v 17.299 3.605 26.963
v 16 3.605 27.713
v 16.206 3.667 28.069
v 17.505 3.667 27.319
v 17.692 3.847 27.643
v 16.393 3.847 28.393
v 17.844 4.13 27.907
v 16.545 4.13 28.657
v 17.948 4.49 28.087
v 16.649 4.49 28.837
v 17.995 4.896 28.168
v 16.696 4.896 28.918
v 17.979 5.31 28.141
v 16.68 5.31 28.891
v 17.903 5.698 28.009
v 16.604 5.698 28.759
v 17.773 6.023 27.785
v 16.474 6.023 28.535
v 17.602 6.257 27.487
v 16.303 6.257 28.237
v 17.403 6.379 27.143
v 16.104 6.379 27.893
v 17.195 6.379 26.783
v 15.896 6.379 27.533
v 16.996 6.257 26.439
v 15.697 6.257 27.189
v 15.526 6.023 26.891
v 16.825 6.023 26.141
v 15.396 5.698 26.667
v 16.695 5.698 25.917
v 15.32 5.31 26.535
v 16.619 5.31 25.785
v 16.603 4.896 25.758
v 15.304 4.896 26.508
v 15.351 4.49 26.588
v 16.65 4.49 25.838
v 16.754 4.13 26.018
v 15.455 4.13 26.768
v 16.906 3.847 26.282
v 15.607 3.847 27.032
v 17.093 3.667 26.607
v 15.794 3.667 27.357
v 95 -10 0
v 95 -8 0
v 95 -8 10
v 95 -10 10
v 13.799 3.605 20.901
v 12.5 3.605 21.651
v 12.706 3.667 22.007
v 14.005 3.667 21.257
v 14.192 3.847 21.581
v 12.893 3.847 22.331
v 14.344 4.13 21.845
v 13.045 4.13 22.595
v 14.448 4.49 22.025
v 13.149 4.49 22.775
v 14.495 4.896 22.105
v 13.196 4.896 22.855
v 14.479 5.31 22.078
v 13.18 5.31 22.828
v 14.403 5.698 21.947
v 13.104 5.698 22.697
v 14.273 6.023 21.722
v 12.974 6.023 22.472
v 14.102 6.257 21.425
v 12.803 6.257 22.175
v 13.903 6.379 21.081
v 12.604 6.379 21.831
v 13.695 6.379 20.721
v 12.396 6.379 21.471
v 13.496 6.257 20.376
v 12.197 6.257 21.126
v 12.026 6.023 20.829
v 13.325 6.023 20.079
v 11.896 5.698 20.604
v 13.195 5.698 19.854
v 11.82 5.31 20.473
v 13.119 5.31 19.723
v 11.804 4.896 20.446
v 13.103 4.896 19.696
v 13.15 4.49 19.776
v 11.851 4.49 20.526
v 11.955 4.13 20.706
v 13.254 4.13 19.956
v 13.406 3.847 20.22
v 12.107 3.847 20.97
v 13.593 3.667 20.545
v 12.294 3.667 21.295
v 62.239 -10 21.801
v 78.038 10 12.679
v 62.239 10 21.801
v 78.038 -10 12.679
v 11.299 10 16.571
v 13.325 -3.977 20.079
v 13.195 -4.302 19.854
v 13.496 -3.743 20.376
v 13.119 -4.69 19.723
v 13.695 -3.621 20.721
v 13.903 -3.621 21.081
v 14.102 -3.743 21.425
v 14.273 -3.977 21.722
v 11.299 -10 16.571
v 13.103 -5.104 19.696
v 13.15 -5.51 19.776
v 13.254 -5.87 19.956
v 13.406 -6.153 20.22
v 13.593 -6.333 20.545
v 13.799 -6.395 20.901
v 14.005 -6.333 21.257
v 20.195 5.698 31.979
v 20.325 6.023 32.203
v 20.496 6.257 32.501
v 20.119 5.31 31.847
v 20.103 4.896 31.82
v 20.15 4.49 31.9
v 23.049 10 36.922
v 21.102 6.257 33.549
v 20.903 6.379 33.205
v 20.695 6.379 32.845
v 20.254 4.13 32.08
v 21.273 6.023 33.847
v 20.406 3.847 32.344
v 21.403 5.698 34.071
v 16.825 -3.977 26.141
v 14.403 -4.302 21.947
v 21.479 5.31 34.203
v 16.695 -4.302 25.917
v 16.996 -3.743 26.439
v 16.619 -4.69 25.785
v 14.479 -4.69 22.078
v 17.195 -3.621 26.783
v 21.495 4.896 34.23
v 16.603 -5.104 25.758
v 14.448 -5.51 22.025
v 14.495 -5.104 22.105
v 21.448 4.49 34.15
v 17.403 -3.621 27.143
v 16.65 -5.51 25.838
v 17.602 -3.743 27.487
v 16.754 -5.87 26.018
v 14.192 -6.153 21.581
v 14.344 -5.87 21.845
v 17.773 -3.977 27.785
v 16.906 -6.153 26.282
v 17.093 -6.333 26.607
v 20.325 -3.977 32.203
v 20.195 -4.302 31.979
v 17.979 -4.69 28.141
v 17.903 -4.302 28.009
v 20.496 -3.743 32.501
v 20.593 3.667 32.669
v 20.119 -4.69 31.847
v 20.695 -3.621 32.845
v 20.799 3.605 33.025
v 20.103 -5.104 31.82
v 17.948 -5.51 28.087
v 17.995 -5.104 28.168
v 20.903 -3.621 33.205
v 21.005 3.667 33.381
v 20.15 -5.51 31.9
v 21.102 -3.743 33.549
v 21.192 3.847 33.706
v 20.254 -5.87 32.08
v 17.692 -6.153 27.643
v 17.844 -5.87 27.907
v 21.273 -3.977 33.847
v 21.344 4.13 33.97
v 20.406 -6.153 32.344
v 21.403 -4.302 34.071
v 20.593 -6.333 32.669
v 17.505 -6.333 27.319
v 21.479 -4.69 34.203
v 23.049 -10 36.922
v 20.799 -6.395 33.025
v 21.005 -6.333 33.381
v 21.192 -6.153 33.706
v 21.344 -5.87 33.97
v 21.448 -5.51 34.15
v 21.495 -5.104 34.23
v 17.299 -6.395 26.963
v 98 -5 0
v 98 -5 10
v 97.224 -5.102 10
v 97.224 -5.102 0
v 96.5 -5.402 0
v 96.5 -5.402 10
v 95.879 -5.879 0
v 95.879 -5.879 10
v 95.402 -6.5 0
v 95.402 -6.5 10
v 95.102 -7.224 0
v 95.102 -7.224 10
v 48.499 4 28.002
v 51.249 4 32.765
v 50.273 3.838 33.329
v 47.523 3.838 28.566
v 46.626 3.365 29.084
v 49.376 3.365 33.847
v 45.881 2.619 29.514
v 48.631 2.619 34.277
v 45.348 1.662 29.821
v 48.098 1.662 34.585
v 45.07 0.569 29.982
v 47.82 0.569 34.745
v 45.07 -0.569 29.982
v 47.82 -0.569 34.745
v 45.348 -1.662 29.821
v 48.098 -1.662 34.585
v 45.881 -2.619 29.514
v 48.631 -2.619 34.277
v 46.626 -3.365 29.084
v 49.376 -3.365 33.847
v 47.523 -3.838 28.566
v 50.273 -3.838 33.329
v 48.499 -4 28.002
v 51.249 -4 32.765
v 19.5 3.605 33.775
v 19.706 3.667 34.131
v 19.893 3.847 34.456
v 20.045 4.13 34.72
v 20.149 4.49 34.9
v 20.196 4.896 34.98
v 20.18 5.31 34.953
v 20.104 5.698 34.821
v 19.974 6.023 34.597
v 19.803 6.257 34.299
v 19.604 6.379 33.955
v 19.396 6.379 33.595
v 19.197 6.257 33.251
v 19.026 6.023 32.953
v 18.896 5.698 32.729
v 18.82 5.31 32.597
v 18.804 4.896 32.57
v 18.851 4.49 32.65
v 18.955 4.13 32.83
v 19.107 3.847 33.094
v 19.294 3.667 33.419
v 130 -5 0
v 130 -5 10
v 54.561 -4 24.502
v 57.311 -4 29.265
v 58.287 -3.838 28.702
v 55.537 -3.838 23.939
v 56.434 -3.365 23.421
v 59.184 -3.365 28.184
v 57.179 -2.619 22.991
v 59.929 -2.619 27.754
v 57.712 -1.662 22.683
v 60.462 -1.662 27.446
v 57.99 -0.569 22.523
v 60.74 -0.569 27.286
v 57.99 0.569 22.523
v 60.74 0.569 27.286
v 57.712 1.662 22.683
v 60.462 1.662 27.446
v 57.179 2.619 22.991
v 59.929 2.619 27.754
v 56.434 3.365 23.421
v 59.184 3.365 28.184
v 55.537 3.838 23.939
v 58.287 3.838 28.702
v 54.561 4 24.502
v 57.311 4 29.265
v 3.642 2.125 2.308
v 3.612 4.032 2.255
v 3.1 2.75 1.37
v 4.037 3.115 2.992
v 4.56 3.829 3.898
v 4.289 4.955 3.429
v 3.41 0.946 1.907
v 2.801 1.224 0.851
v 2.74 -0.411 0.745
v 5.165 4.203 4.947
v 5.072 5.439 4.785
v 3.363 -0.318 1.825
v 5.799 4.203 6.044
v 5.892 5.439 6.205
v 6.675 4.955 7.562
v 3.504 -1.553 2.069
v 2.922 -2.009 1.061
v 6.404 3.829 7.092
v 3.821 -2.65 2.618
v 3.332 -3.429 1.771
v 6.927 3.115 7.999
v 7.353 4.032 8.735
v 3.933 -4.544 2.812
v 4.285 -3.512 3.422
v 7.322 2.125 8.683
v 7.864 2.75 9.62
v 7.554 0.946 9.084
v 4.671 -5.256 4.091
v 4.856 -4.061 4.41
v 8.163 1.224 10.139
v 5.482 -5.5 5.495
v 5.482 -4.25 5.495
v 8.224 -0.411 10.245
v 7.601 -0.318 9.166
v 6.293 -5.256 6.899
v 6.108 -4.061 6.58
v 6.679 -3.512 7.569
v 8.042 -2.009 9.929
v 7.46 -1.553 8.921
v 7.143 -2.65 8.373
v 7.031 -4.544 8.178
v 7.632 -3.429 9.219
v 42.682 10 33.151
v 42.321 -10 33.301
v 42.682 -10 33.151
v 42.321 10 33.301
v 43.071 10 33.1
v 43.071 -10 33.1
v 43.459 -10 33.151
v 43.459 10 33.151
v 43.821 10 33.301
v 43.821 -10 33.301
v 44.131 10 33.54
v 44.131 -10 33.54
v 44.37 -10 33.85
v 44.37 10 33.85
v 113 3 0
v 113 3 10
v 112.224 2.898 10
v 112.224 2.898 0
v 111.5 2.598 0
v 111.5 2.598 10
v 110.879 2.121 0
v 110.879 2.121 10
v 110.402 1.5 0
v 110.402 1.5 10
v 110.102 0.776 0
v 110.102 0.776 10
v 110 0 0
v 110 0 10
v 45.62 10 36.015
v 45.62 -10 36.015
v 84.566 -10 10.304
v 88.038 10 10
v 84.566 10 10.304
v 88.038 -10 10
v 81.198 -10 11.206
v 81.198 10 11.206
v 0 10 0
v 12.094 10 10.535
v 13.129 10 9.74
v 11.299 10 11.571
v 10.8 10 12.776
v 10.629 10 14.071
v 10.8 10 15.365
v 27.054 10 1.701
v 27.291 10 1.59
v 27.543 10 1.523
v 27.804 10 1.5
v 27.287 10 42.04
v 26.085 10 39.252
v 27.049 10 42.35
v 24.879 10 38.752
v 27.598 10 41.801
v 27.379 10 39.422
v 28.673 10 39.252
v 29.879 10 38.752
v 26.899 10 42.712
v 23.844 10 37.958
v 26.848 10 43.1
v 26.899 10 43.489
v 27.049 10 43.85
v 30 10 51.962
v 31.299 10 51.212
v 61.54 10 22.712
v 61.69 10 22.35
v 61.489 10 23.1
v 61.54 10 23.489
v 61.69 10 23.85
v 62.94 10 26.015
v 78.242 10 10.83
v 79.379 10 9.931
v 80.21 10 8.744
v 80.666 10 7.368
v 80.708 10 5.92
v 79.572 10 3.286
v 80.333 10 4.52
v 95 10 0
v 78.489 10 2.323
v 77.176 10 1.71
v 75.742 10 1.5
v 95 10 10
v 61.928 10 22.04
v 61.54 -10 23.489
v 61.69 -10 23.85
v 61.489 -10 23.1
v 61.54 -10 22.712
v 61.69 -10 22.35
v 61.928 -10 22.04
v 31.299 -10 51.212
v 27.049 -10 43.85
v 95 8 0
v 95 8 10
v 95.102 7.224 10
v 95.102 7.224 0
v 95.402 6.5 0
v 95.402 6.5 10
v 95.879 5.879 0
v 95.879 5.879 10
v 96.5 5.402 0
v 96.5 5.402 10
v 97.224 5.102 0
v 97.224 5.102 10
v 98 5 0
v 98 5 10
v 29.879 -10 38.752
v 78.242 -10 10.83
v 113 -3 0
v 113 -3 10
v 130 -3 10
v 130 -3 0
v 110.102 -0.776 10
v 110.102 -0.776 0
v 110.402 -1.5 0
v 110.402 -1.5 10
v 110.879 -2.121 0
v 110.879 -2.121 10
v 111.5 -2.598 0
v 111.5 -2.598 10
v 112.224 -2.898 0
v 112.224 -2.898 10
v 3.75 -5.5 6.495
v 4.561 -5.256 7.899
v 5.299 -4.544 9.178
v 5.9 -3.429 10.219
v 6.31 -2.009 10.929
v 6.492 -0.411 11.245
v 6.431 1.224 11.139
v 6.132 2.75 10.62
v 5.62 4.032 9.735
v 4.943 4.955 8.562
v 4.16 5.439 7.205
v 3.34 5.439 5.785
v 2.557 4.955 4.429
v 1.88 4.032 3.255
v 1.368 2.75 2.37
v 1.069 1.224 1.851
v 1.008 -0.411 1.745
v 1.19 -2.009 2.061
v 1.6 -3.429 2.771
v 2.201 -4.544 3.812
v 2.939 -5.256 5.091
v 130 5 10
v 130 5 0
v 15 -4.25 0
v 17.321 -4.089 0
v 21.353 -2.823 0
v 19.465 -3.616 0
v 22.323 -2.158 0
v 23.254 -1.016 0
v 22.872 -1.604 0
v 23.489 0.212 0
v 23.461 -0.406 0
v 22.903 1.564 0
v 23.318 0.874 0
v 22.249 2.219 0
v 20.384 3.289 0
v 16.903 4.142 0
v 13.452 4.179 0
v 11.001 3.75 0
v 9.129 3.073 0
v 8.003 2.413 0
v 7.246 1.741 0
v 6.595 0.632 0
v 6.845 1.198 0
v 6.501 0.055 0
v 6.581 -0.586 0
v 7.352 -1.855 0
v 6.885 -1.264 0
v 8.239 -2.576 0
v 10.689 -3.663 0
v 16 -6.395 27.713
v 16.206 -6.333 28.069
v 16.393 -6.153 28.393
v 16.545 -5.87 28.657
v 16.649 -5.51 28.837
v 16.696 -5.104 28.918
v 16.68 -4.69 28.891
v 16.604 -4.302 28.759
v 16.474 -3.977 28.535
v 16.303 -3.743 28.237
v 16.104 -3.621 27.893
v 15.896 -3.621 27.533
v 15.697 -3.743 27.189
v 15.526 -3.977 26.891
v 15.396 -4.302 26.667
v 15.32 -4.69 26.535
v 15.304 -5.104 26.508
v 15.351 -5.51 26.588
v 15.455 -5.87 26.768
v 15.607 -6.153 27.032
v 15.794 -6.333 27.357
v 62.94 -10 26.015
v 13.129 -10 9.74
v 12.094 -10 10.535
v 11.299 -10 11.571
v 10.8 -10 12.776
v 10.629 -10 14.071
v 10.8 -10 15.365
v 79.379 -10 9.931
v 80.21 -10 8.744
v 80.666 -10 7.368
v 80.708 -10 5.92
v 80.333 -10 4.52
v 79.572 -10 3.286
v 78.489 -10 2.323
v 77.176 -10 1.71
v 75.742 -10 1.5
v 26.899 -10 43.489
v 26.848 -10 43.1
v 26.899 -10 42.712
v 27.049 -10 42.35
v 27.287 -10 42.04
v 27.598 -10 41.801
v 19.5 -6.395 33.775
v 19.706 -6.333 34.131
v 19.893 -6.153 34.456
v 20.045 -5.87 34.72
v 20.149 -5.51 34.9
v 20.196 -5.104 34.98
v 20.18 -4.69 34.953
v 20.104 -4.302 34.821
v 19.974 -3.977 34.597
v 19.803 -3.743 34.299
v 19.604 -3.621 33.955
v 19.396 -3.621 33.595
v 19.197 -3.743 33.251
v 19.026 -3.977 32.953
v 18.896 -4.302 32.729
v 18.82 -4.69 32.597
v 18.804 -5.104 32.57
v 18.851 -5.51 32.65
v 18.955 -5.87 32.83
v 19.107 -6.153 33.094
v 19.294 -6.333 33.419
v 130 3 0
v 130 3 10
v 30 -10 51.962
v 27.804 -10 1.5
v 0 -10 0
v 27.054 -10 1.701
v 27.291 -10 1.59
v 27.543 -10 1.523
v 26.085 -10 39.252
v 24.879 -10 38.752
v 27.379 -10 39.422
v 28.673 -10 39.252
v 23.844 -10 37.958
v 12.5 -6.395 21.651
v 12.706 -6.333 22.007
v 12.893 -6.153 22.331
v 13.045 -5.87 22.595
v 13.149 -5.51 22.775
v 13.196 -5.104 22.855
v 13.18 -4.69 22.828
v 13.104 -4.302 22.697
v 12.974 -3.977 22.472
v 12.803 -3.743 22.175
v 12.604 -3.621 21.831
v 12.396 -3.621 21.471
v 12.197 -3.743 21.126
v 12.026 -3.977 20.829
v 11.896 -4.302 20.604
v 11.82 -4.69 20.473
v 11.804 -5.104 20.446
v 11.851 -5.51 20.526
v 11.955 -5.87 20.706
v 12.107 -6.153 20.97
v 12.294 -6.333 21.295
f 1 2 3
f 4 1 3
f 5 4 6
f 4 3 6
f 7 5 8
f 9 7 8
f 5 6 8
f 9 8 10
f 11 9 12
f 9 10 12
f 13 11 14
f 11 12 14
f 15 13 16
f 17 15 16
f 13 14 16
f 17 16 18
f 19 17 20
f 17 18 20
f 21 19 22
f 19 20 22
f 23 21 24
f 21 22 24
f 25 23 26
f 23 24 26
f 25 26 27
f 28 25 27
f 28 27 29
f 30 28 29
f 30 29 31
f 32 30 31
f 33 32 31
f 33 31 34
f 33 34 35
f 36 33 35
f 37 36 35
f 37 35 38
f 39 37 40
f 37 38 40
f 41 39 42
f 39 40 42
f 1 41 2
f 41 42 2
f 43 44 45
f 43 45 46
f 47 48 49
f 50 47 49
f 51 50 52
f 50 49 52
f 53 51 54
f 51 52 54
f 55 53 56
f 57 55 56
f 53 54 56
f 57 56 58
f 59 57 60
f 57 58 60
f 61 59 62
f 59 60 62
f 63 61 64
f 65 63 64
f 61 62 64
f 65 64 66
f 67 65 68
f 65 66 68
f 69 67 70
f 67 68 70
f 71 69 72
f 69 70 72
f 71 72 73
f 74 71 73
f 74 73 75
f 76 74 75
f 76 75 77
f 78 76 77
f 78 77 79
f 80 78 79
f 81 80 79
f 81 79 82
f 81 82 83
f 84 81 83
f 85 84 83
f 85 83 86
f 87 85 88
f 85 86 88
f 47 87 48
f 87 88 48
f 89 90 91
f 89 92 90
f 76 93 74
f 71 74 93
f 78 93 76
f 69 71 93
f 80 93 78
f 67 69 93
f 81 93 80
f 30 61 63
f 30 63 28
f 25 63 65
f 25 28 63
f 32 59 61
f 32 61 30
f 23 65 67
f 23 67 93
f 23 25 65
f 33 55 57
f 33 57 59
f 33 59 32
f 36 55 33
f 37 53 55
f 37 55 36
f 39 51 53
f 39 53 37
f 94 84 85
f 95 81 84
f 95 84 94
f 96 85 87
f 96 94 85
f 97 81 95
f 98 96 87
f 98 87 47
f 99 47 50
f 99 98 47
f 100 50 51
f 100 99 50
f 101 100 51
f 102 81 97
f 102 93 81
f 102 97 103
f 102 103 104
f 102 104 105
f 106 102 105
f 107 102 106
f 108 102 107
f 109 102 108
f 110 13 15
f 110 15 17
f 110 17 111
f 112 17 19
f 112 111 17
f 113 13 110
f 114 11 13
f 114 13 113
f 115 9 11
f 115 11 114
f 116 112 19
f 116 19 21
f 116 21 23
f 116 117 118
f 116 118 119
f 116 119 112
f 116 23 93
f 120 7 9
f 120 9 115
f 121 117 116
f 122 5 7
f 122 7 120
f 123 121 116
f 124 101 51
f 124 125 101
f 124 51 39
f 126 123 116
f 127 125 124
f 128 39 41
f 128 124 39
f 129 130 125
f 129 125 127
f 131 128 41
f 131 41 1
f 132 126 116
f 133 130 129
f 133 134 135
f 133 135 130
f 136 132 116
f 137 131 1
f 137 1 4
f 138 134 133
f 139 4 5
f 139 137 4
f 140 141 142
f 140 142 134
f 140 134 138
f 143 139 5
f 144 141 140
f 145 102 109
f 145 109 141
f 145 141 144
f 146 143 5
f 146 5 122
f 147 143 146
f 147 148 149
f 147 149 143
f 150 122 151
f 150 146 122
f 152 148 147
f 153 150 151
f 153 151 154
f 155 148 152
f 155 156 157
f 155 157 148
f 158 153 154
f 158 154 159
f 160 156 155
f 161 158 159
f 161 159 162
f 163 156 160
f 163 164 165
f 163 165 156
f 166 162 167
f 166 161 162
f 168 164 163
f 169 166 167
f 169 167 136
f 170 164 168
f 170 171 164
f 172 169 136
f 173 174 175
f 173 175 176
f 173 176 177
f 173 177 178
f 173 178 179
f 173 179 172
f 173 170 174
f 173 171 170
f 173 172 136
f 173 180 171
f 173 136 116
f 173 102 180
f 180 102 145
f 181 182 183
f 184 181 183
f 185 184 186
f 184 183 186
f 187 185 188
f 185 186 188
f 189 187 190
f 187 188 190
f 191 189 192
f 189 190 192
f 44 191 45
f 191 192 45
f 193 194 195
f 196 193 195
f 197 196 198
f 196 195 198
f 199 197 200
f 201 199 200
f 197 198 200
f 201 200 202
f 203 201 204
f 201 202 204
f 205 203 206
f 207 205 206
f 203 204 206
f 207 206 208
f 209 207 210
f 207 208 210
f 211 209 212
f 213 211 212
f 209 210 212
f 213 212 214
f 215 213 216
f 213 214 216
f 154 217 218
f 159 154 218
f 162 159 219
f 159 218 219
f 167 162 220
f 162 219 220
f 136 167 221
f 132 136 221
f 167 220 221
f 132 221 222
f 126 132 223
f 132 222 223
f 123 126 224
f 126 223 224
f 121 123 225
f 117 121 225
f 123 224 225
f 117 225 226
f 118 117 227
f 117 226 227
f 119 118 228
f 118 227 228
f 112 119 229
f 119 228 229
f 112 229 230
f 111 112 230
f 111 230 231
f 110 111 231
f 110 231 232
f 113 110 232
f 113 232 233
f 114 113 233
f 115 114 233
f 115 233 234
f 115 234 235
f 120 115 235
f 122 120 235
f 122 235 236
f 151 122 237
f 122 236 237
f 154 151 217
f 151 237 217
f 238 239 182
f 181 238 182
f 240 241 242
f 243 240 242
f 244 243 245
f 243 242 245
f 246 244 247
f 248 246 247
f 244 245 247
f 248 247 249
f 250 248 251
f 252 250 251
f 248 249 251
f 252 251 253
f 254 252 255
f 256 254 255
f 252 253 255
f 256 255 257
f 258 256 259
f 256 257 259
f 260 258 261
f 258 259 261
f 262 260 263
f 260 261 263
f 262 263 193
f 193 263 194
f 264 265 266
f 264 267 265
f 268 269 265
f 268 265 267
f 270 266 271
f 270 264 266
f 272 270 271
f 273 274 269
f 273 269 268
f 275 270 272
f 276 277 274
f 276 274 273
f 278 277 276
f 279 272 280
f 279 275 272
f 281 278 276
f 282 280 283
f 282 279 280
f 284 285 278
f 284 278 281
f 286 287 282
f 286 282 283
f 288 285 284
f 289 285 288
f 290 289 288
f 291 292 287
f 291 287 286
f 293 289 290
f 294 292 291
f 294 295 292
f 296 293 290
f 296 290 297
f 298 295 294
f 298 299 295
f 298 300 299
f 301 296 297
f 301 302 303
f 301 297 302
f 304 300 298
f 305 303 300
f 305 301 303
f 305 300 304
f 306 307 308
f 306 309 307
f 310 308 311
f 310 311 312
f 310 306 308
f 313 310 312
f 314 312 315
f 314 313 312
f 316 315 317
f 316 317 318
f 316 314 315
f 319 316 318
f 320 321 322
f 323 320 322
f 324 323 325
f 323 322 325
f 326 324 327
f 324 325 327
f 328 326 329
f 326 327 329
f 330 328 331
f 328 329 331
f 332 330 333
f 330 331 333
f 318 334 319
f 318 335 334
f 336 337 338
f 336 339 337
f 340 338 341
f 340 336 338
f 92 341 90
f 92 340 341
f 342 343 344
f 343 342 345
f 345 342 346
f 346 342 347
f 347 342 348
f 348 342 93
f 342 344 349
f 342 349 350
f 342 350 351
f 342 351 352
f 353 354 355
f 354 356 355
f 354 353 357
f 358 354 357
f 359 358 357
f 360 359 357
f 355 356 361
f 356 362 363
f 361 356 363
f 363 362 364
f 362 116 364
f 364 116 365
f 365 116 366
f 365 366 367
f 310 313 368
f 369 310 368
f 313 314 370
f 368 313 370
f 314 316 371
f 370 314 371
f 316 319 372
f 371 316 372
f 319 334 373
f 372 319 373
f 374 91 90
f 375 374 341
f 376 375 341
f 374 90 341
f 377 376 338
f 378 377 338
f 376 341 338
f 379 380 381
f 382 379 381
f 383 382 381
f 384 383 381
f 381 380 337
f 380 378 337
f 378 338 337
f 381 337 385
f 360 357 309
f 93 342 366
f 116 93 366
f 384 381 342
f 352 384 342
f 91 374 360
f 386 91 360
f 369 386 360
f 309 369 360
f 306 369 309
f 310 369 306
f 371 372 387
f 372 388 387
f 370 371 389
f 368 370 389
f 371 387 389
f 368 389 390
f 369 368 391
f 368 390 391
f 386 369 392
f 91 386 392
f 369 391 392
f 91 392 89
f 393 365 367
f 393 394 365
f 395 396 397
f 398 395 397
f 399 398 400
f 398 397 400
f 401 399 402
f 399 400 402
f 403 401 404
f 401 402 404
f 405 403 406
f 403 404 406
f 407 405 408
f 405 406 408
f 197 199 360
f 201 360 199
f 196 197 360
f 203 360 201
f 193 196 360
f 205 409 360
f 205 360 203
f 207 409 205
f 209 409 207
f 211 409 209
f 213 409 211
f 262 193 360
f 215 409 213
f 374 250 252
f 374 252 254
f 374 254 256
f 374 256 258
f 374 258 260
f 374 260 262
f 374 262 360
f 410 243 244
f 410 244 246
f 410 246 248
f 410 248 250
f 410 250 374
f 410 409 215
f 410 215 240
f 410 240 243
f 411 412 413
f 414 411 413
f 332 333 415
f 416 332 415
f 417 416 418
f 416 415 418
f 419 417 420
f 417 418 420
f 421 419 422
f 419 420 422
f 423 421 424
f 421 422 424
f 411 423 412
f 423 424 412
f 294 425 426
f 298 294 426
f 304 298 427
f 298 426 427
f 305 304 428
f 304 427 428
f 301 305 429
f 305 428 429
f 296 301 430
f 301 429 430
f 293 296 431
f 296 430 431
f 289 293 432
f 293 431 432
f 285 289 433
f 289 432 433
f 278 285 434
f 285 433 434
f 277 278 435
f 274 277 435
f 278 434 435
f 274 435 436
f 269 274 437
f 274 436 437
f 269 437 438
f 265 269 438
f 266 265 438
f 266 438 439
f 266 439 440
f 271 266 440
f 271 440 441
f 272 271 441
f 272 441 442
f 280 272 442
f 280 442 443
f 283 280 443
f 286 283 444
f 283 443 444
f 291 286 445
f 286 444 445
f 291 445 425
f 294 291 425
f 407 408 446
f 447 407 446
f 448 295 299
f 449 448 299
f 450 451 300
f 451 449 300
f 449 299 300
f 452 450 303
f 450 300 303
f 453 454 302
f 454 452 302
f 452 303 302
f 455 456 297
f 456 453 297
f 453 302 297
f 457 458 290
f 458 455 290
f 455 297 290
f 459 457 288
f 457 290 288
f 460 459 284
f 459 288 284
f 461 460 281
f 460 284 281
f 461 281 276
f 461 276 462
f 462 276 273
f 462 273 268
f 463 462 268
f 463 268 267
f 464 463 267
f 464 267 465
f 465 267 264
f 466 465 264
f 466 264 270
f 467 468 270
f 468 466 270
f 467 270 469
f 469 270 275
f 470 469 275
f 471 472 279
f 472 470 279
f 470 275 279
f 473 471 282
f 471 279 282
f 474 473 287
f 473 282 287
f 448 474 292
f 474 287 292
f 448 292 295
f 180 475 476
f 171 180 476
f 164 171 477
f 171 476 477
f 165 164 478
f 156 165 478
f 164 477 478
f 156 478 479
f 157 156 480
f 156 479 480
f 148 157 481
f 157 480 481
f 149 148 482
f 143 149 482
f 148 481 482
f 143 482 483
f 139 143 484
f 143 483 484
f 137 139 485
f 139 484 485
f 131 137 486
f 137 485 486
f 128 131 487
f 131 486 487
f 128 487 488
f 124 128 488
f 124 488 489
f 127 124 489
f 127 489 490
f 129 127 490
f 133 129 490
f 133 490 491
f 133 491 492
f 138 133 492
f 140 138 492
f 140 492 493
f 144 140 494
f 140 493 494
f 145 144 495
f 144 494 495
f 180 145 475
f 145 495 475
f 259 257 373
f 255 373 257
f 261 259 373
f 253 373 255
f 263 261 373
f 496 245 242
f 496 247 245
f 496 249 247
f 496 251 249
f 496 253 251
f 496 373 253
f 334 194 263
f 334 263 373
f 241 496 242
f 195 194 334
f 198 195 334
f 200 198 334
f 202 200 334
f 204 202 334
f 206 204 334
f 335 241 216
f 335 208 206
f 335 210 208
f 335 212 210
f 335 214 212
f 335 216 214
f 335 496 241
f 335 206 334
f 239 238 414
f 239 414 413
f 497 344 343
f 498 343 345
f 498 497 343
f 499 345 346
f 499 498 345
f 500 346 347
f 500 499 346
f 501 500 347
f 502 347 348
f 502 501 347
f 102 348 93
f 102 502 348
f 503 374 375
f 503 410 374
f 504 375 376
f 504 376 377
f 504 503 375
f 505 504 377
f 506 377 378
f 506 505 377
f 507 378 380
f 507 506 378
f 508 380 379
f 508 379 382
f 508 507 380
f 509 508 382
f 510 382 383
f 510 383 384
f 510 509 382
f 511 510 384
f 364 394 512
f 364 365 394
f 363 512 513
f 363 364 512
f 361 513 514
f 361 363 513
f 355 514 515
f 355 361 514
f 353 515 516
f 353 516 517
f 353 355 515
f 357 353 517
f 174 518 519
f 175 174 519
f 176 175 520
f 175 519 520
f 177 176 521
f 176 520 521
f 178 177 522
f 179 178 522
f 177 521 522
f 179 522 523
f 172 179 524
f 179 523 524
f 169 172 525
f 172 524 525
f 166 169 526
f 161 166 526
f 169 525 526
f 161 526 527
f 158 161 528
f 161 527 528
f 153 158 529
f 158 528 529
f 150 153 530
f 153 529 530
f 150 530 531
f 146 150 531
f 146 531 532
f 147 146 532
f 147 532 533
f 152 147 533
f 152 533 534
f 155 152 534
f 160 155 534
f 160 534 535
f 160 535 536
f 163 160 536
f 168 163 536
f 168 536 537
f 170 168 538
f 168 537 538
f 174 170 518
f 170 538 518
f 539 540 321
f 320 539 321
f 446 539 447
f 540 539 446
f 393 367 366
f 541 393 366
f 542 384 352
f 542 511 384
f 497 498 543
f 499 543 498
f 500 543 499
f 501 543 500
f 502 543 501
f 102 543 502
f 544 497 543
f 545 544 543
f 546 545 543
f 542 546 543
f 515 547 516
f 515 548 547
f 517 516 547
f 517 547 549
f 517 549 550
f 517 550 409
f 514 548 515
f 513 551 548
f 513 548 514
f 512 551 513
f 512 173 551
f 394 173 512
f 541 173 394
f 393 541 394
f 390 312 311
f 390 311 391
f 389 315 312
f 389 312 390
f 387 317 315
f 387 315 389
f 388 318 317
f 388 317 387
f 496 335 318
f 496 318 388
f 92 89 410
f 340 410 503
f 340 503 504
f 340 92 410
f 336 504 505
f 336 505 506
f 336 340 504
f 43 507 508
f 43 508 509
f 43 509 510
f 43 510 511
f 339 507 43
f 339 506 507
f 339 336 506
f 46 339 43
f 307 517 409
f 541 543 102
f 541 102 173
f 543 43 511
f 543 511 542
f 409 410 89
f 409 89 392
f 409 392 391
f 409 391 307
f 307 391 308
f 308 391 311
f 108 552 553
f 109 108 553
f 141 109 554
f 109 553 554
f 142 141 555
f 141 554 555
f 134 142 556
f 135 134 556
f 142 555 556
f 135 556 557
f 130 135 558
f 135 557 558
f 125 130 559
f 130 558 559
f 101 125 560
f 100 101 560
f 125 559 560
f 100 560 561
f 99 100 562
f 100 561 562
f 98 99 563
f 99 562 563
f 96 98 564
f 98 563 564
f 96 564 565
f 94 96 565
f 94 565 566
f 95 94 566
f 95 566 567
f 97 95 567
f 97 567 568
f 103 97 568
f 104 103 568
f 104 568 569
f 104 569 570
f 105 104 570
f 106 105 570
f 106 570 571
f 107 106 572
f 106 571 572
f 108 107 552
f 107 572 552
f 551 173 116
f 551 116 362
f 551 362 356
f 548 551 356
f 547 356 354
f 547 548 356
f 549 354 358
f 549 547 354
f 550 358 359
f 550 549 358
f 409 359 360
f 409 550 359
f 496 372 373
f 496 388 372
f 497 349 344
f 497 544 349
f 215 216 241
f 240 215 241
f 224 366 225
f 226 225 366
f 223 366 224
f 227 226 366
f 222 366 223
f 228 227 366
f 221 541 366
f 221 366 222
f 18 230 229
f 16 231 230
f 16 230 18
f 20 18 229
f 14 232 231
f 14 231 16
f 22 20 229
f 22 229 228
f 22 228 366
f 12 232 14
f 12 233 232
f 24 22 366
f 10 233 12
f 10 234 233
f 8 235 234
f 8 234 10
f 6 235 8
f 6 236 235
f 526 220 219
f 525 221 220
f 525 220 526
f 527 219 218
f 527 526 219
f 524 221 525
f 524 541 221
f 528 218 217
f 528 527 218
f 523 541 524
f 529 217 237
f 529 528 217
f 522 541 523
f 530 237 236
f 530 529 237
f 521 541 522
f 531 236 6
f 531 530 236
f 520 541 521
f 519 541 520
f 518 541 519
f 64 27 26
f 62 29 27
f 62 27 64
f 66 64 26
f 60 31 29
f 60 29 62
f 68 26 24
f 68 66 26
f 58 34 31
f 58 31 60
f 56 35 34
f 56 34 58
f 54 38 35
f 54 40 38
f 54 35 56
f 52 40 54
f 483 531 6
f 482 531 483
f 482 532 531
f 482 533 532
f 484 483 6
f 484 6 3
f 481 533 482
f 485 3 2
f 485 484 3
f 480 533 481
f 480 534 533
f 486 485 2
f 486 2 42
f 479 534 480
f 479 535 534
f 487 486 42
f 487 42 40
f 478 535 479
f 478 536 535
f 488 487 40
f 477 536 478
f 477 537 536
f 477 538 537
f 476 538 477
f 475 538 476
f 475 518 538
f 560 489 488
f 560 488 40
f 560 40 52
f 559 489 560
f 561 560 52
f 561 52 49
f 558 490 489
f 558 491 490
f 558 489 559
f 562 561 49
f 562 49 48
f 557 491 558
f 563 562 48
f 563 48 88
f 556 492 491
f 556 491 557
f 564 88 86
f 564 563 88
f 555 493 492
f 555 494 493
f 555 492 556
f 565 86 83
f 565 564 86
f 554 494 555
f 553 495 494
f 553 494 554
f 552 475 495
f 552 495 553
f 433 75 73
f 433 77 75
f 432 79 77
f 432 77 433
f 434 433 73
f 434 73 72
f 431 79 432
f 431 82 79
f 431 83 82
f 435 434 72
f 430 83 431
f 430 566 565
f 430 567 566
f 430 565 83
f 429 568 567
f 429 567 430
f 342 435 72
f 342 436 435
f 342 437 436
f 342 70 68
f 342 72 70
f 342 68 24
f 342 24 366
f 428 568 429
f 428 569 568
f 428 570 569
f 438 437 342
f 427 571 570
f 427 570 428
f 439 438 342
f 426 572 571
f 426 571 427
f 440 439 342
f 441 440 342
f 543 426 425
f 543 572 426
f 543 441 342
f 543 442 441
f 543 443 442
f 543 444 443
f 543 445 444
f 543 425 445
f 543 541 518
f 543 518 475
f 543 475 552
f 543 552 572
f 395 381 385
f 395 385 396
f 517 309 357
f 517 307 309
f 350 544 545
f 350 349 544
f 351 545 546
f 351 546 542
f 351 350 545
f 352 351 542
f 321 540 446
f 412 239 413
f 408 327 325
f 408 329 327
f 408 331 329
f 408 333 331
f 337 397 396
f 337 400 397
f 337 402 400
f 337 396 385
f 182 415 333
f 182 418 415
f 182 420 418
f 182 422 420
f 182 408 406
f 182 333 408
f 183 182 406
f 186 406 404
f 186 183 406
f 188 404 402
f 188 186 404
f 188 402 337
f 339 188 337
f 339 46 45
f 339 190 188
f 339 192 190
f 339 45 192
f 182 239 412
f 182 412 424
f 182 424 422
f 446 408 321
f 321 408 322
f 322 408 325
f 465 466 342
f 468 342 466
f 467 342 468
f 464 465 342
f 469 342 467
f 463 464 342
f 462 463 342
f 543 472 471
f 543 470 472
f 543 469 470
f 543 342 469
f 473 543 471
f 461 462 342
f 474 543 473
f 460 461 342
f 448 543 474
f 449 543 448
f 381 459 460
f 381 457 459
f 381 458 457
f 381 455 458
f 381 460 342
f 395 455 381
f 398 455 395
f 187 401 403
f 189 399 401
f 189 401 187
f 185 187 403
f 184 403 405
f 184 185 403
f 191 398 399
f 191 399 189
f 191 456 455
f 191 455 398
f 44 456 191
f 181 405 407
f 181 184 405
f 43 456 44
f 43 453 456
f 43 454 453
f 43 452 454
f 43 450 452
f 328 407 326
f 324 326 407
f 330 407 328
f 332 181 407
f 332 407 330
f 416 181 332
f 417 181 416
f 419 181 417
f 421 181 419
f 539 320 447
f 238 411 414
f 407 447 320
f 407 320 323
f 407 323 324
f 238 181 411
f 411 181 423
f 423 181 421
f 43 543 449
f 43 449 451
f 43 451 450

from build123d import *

# Parameters (mm, degrees)
F1_DEPTH      = 10
F1_DEPTH_BACK = 10
F3_DEPTH      = 10.001
F5_DEPTH      = 5.5
F6_R          = 1.395
F7_DEPTH      = 1.5
F8_R          = 5.5
F9_DEPTH      = 2
F10_R         = 4.25
F11_DEPTH     = 110.584302492
F12_R         = 1.5
F13_R         = 20


with BuildPart() as f1:
    # F0 (on Front) → F1 (new body, two sides)
    with BuildSketch(Plane.XZ) as f1_sk:
        Polygon((30, 51.9615242271), (0, 0), (130, 0), (130, 10), (82.6794919243, 10), (60.9400542571, 22.5512701892), (62.9400542571, 26.0153718044), (45.6195461814, 36.0153718044), (43.6195461814, 32.5512701892), (26.2990381057, 42.5512701892), (31.2990381057, 51.2115242271), align=None)
        with BuildLine():
            ThreePointArc((23.0490381057, 36.9221050646), (26.0850698991, 39.2517341961), (29.8791651246, 38.7522320835))
            Line((29.8791651246, 38.7522320835), (78.2416697508, 10.8301270189))
            ThreePointArc((78.2416697508, 10.8301270189), (80.5712988822, 5.2059047745), (75.7416697508, 1.5))
            Line((75.7416697508, 1.5), (27.4019237886, 1.5))
            Line((27.4019237886, 1.5), (13.1291651246, 9.7403810568))
            ThreePointArc((13.1291651246, 9.7403810568), (10.7995359932, 12.7764128502), (11.2990381057, 16.5705080757))
            Line((11.2990381057, 16.5705080757), (23.0490381057, 36.9221050646))
        make_face(mode=Mode.SUBTRACT)
    extrude(amount=F1_DEPTH)
    extrude(f1_sk.sketch, amount=-F1_DEPTH_BACK)

    # F2 (on face) → F3 (cut, through all)
    with BuildSketch(Plane.XY.offset(10)):
        with BuildLine():
            Line((98, 5), (130, 5))
            Line((130, 5), (130, 10))
            Line((130, 10), (95, 10))
            Line((95, 10), (95, 8))
            ThreePointArc((95, 8), (95.8786796564, 5.8786796564), (98, 5))
        make_face()
        with BuildLine():
            Line((130, 0), (130, 3))
            Line((130, 3), (113, 3))
            ThreePointArc((113, 3), (110.8786796564, 2.1213203436), (110, 0))
            ThreePointArc((110, 0), (110.8786796564, -2.1213203436), (113, -3))
            Line((113, -3), (130, -3))
            Line((130, -3), (130, 0))
        make_face()
        with BuildLine():
            ThreePointArc((98, -5), (95.8786796564, -5.8786796564), (95, -8))
            Line((95, -8), (95, -10))
            Line((95, -10), (130, -10))
            Line((130, -10), (130, -5))
            Line((130, -5), (98, -5))
        make_face()
    extrude(amount=-F3_DEPTH, mode=Mode.SUBTRACT)

    # F4 (on face) → F5 (cut, through all)
    with BuildSketch(Plane(origin=(27, 0, 46.7653718044), x_dir=(0.8660254038, 0, -0.5), z_dir=(0.5, 0, 0.8660254038))):
        with BuildLine():
            Line((28, -4), (35, -4))
            ThreePointArc((35, -4), (39, 0), (35, 4))
            Line((35, 4), (28, 4))
            ThreePointArc((28, 4), (24, 0), (28, -4))
        make_face()
    extrude(amount=-F5_DEPTH, mode=Mode.SUBTRACT)

    # F6 (on face) → F7 (cut, through all)
    with BuildSketch(Plane(origin=(0, 0, 0), x_dir=(0, -1, 0), z_dir=(-0.8660254038, 0, 0.5))):
        with Locations((-5, 39)):
            Circle(F6_R)
        with Locations((5, 39)):
            Circle(F6_R)
        with Locations((-5, 32)):
            Circle(F6_R)
        with Locations((5, 32)):
            Circle(F6_R)
        with Locations((-5, 25)):
            Circle(F6_R)
        with Locations((5, 25)):
            Circle(F6_R)
    extrude(amount=-F7_DEPTH, mode=Mode.SUBTRACT)

    # F8 (on face) → F9 (cut)
    with BuildSketch(Plane(origin=(0, 0, 0), x_dir=(0, -1, 0), z_dir=(-0.8660254038, 0, 0.5))):
        with Locations((0, 7.5)):
            Circle(F8_R)
    extrude(amount=-F9_DEPTH, mode=Mode.SUBTRACT)

    # F10 (on face) → F11 (cut, through all)
    with BuildSketch(Plane(origin=(1.7320508076, 0, -1), x_dir=(0, -1, 0), z_dir=(-0.8660254038, 0, 0.5))):
        with Locations((0, 7.5)):
            Circle(F10_R)
    extrude(amount=-F11_DEPTH, mode=Mode.SUBTRACT)

    # F12
    f12_edges = [f1.edges().sort_by_distance(p)[0] for p in [
        (26.299038, 0, 42.55127),
        (60.940054, 0, 22.55127),
        (27.401924, 0, 1.5),
        (43.619546, 0, 32.55127),
    ]]
    fillet(f12_edges, radius=F12_R)

    # F13
    f13_edges = [f1.edges().sort_by_distance(p)[0] for p in [
        (82.679492, 0, 10),
    ]]
    fillet(f13_edges, radius=F13_R)


solid = f1.part
